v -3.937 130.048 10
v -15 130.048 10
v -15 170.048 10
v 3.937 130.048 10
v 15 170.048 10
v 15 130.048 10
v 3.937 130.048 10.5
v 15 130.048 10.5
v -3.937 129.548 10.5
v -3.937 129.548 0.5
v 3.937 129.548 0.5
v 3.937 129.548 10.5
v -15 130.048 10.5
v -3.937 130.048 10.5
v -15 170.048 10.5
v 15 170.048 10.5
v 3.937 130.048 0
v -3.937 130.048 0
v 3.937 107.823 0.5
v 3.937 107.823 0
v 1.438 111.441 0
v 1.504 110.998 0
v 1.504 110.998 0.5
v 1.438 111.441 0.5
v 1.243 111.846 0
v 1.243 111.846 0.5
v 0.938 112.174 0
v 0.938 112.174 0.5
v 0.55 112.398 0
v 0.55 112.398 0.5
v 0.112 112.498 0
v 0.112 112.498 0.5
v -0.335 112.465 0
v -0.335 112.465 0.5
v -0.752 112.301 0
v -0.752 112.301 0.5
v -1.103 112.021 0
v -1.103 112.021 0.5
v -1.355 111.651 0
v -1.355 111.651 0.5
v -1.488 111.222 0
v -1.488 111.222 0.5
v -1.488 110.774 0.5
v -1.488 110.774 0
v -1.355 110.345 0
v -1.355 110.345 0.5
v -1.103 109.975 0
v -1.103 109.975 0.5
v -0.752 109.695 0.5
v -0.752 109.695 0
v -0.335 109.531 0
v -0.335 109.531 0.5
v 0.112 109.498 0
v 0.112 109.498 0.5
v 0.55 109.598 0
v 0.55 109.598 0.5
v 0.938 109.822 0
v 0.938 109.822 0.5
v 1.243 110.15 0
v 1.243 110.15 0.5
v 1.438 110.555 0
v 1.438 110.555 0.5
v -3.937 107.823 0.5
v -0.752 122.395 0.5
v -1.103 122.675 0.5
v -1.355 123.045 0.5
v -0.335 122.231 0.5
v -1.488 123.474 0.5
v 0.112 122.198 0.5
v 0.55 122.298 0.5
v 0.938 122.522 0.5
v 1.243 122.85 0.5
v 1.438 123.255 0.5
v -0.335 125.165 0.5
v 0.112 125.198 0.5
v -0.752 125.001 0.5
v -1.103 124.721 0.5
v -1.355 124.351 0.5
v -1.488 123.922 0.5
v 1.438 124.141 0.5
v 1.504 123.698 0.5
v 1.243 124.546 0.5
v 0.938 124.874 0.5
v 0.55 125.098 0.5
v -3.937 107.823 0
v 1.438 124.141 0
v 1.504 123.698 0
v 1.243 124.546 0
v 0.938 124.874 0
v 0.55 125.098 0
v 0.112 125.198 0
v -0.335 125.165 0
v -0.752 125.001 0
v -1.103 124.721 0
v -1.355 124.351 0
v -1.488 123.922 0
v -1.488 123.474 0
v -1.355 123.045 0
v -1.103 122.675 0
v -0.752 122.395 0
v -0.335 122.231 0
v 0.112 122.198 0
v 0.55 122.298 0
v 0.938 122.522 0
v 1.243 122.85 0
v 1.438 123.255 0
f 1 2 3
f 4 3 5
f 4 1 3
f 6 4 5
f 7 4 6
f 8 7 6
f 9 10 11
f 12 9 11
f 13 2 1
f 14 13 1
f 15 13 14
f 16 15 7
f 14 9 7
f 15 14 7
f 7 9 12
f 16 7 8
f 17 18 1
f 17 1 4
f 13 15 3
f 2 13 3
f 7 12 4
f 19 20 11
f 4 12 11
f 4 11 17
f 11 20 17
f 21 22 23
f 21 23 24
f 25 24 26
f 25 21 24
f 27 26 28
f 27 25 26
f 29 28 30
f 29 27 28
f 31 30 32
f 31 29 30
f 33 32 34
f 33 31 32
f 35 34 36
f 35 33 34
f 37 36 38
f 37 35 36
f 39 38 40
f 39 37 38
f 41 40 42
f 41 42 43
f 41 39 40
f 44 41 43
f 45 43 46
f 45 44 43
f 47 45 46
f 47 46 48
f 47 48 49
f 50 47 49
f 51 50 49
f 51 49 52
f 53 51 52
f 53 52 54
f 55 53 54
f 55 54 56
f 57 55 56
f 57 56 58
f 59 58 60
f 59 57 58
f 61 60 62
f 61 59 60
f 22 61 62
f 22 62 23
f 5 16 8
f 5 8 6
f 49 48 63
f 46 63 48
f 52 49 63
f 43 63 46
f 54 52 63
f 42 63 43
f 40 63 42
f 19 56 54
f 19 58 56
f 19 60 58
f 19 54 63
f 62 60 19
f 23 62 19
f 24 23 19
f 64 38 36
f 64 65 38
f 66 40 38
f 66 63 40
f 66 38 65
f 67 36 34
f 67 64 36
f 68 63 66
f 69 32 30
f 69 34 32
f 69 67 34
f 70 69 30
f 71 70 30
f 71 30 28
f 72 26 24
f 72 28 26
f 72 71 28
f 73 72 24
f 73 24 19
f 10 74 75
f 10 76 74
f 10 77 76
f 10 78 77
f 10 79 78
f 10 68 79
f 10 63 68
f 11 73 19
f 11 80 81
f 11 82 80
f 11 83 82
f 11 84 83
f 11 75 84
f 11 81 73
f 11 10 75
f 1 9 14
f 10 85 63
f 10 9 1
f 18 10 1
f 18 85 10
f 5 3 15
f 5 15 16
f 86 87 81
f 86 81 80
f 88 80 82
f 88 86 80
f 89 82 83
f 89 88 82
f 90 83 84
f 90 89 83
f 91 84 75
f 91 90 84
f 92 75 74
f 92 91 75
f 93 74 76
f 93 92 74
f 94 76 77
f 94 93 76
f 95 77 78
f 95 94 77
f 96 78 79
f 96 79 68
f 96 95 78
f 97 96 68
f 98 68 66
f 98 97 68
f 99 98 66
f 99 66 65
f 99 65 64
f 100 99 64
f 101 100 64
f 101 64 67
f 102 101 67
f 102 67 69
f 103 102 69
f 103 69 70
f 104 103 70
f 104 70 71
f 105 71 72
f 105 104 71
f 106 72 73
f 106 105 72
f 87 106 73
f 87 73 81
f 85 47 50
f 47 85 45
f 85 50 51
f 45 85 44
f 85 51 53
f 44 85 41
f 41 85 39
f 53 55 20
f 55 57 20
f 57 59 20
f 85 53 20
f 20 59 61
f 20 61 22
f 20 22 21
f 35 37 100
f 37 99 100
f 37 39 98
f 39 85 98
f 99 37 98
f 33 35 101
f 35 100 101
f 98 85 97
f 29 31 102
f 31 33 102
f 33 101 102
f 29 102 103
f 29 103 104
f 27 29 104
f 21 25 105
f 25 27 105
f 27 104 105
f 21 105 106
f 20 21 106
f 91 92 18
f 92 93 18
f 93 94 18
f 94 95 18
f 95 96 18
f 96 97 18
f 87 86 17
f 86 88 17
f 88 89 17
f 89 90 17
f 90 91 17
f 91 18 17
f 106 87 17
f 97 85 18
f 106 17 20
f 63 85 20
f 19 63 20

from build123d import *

# Parameters (mm, degrees)
SKETCH1_W           = 7.874
SKETCH1_H           = 22.225
SKETCH1_R           = 1.504480346
BOSS_EXTRUDE1_DEPTH = 0.5
SKETCH2_W           = 7.874
SKETCH2_H           = 0.5
BOSS_EXTRUDE2_DEPTH = 10
SKETCH3_W           = 30
SKETCH3_H           = 0.5
BOSS_EXTRUDE3_DEPTH = 40


with BuildPart() as part:
    # Sketch1 → Boss-Extrude1 (new body)
    with BuildSketch(Plane.XY):
        with Locations((0, 118.9355)):
            Rectangle(SKETCH1_W, SKETCH1_H)
        with Locations((0, 123.698)):
            Circle(SKETCH1_R, mode=Mode.SUBTRACT)
        with Locations((0, 110.998)):
            Circle(SKETCH1_R, mode=Mode.SUBTRACT)
    extrude(amount=BOSS_EXTRUDE1_DEPTH)

    # Sketch2 → Boss-Extrude2 (add)
    with BuildSketch(Plane.XY.offset(0.5)):
        with Locations((0, 129.798)):
            Rectangle(SKETCH2_W, SKETCH2_H)
    extrude(amount=BOSS_EXTRUDE2_DEPTH)

    # Sketch3 → Boss-Extrude3 (add)
    with BuildSketch(Plane(origin=(0, 130.048, 0), x_dir=(1, 0, 0), z_dir=(0, 1, 0))):
        with Locations((0, -10.25)):
            Rectangle(SKETCH3_W, SKETCH3_H)
    extrude(amount=BOSS_EXTRUDE3_DEPTH)


solid = part.part
